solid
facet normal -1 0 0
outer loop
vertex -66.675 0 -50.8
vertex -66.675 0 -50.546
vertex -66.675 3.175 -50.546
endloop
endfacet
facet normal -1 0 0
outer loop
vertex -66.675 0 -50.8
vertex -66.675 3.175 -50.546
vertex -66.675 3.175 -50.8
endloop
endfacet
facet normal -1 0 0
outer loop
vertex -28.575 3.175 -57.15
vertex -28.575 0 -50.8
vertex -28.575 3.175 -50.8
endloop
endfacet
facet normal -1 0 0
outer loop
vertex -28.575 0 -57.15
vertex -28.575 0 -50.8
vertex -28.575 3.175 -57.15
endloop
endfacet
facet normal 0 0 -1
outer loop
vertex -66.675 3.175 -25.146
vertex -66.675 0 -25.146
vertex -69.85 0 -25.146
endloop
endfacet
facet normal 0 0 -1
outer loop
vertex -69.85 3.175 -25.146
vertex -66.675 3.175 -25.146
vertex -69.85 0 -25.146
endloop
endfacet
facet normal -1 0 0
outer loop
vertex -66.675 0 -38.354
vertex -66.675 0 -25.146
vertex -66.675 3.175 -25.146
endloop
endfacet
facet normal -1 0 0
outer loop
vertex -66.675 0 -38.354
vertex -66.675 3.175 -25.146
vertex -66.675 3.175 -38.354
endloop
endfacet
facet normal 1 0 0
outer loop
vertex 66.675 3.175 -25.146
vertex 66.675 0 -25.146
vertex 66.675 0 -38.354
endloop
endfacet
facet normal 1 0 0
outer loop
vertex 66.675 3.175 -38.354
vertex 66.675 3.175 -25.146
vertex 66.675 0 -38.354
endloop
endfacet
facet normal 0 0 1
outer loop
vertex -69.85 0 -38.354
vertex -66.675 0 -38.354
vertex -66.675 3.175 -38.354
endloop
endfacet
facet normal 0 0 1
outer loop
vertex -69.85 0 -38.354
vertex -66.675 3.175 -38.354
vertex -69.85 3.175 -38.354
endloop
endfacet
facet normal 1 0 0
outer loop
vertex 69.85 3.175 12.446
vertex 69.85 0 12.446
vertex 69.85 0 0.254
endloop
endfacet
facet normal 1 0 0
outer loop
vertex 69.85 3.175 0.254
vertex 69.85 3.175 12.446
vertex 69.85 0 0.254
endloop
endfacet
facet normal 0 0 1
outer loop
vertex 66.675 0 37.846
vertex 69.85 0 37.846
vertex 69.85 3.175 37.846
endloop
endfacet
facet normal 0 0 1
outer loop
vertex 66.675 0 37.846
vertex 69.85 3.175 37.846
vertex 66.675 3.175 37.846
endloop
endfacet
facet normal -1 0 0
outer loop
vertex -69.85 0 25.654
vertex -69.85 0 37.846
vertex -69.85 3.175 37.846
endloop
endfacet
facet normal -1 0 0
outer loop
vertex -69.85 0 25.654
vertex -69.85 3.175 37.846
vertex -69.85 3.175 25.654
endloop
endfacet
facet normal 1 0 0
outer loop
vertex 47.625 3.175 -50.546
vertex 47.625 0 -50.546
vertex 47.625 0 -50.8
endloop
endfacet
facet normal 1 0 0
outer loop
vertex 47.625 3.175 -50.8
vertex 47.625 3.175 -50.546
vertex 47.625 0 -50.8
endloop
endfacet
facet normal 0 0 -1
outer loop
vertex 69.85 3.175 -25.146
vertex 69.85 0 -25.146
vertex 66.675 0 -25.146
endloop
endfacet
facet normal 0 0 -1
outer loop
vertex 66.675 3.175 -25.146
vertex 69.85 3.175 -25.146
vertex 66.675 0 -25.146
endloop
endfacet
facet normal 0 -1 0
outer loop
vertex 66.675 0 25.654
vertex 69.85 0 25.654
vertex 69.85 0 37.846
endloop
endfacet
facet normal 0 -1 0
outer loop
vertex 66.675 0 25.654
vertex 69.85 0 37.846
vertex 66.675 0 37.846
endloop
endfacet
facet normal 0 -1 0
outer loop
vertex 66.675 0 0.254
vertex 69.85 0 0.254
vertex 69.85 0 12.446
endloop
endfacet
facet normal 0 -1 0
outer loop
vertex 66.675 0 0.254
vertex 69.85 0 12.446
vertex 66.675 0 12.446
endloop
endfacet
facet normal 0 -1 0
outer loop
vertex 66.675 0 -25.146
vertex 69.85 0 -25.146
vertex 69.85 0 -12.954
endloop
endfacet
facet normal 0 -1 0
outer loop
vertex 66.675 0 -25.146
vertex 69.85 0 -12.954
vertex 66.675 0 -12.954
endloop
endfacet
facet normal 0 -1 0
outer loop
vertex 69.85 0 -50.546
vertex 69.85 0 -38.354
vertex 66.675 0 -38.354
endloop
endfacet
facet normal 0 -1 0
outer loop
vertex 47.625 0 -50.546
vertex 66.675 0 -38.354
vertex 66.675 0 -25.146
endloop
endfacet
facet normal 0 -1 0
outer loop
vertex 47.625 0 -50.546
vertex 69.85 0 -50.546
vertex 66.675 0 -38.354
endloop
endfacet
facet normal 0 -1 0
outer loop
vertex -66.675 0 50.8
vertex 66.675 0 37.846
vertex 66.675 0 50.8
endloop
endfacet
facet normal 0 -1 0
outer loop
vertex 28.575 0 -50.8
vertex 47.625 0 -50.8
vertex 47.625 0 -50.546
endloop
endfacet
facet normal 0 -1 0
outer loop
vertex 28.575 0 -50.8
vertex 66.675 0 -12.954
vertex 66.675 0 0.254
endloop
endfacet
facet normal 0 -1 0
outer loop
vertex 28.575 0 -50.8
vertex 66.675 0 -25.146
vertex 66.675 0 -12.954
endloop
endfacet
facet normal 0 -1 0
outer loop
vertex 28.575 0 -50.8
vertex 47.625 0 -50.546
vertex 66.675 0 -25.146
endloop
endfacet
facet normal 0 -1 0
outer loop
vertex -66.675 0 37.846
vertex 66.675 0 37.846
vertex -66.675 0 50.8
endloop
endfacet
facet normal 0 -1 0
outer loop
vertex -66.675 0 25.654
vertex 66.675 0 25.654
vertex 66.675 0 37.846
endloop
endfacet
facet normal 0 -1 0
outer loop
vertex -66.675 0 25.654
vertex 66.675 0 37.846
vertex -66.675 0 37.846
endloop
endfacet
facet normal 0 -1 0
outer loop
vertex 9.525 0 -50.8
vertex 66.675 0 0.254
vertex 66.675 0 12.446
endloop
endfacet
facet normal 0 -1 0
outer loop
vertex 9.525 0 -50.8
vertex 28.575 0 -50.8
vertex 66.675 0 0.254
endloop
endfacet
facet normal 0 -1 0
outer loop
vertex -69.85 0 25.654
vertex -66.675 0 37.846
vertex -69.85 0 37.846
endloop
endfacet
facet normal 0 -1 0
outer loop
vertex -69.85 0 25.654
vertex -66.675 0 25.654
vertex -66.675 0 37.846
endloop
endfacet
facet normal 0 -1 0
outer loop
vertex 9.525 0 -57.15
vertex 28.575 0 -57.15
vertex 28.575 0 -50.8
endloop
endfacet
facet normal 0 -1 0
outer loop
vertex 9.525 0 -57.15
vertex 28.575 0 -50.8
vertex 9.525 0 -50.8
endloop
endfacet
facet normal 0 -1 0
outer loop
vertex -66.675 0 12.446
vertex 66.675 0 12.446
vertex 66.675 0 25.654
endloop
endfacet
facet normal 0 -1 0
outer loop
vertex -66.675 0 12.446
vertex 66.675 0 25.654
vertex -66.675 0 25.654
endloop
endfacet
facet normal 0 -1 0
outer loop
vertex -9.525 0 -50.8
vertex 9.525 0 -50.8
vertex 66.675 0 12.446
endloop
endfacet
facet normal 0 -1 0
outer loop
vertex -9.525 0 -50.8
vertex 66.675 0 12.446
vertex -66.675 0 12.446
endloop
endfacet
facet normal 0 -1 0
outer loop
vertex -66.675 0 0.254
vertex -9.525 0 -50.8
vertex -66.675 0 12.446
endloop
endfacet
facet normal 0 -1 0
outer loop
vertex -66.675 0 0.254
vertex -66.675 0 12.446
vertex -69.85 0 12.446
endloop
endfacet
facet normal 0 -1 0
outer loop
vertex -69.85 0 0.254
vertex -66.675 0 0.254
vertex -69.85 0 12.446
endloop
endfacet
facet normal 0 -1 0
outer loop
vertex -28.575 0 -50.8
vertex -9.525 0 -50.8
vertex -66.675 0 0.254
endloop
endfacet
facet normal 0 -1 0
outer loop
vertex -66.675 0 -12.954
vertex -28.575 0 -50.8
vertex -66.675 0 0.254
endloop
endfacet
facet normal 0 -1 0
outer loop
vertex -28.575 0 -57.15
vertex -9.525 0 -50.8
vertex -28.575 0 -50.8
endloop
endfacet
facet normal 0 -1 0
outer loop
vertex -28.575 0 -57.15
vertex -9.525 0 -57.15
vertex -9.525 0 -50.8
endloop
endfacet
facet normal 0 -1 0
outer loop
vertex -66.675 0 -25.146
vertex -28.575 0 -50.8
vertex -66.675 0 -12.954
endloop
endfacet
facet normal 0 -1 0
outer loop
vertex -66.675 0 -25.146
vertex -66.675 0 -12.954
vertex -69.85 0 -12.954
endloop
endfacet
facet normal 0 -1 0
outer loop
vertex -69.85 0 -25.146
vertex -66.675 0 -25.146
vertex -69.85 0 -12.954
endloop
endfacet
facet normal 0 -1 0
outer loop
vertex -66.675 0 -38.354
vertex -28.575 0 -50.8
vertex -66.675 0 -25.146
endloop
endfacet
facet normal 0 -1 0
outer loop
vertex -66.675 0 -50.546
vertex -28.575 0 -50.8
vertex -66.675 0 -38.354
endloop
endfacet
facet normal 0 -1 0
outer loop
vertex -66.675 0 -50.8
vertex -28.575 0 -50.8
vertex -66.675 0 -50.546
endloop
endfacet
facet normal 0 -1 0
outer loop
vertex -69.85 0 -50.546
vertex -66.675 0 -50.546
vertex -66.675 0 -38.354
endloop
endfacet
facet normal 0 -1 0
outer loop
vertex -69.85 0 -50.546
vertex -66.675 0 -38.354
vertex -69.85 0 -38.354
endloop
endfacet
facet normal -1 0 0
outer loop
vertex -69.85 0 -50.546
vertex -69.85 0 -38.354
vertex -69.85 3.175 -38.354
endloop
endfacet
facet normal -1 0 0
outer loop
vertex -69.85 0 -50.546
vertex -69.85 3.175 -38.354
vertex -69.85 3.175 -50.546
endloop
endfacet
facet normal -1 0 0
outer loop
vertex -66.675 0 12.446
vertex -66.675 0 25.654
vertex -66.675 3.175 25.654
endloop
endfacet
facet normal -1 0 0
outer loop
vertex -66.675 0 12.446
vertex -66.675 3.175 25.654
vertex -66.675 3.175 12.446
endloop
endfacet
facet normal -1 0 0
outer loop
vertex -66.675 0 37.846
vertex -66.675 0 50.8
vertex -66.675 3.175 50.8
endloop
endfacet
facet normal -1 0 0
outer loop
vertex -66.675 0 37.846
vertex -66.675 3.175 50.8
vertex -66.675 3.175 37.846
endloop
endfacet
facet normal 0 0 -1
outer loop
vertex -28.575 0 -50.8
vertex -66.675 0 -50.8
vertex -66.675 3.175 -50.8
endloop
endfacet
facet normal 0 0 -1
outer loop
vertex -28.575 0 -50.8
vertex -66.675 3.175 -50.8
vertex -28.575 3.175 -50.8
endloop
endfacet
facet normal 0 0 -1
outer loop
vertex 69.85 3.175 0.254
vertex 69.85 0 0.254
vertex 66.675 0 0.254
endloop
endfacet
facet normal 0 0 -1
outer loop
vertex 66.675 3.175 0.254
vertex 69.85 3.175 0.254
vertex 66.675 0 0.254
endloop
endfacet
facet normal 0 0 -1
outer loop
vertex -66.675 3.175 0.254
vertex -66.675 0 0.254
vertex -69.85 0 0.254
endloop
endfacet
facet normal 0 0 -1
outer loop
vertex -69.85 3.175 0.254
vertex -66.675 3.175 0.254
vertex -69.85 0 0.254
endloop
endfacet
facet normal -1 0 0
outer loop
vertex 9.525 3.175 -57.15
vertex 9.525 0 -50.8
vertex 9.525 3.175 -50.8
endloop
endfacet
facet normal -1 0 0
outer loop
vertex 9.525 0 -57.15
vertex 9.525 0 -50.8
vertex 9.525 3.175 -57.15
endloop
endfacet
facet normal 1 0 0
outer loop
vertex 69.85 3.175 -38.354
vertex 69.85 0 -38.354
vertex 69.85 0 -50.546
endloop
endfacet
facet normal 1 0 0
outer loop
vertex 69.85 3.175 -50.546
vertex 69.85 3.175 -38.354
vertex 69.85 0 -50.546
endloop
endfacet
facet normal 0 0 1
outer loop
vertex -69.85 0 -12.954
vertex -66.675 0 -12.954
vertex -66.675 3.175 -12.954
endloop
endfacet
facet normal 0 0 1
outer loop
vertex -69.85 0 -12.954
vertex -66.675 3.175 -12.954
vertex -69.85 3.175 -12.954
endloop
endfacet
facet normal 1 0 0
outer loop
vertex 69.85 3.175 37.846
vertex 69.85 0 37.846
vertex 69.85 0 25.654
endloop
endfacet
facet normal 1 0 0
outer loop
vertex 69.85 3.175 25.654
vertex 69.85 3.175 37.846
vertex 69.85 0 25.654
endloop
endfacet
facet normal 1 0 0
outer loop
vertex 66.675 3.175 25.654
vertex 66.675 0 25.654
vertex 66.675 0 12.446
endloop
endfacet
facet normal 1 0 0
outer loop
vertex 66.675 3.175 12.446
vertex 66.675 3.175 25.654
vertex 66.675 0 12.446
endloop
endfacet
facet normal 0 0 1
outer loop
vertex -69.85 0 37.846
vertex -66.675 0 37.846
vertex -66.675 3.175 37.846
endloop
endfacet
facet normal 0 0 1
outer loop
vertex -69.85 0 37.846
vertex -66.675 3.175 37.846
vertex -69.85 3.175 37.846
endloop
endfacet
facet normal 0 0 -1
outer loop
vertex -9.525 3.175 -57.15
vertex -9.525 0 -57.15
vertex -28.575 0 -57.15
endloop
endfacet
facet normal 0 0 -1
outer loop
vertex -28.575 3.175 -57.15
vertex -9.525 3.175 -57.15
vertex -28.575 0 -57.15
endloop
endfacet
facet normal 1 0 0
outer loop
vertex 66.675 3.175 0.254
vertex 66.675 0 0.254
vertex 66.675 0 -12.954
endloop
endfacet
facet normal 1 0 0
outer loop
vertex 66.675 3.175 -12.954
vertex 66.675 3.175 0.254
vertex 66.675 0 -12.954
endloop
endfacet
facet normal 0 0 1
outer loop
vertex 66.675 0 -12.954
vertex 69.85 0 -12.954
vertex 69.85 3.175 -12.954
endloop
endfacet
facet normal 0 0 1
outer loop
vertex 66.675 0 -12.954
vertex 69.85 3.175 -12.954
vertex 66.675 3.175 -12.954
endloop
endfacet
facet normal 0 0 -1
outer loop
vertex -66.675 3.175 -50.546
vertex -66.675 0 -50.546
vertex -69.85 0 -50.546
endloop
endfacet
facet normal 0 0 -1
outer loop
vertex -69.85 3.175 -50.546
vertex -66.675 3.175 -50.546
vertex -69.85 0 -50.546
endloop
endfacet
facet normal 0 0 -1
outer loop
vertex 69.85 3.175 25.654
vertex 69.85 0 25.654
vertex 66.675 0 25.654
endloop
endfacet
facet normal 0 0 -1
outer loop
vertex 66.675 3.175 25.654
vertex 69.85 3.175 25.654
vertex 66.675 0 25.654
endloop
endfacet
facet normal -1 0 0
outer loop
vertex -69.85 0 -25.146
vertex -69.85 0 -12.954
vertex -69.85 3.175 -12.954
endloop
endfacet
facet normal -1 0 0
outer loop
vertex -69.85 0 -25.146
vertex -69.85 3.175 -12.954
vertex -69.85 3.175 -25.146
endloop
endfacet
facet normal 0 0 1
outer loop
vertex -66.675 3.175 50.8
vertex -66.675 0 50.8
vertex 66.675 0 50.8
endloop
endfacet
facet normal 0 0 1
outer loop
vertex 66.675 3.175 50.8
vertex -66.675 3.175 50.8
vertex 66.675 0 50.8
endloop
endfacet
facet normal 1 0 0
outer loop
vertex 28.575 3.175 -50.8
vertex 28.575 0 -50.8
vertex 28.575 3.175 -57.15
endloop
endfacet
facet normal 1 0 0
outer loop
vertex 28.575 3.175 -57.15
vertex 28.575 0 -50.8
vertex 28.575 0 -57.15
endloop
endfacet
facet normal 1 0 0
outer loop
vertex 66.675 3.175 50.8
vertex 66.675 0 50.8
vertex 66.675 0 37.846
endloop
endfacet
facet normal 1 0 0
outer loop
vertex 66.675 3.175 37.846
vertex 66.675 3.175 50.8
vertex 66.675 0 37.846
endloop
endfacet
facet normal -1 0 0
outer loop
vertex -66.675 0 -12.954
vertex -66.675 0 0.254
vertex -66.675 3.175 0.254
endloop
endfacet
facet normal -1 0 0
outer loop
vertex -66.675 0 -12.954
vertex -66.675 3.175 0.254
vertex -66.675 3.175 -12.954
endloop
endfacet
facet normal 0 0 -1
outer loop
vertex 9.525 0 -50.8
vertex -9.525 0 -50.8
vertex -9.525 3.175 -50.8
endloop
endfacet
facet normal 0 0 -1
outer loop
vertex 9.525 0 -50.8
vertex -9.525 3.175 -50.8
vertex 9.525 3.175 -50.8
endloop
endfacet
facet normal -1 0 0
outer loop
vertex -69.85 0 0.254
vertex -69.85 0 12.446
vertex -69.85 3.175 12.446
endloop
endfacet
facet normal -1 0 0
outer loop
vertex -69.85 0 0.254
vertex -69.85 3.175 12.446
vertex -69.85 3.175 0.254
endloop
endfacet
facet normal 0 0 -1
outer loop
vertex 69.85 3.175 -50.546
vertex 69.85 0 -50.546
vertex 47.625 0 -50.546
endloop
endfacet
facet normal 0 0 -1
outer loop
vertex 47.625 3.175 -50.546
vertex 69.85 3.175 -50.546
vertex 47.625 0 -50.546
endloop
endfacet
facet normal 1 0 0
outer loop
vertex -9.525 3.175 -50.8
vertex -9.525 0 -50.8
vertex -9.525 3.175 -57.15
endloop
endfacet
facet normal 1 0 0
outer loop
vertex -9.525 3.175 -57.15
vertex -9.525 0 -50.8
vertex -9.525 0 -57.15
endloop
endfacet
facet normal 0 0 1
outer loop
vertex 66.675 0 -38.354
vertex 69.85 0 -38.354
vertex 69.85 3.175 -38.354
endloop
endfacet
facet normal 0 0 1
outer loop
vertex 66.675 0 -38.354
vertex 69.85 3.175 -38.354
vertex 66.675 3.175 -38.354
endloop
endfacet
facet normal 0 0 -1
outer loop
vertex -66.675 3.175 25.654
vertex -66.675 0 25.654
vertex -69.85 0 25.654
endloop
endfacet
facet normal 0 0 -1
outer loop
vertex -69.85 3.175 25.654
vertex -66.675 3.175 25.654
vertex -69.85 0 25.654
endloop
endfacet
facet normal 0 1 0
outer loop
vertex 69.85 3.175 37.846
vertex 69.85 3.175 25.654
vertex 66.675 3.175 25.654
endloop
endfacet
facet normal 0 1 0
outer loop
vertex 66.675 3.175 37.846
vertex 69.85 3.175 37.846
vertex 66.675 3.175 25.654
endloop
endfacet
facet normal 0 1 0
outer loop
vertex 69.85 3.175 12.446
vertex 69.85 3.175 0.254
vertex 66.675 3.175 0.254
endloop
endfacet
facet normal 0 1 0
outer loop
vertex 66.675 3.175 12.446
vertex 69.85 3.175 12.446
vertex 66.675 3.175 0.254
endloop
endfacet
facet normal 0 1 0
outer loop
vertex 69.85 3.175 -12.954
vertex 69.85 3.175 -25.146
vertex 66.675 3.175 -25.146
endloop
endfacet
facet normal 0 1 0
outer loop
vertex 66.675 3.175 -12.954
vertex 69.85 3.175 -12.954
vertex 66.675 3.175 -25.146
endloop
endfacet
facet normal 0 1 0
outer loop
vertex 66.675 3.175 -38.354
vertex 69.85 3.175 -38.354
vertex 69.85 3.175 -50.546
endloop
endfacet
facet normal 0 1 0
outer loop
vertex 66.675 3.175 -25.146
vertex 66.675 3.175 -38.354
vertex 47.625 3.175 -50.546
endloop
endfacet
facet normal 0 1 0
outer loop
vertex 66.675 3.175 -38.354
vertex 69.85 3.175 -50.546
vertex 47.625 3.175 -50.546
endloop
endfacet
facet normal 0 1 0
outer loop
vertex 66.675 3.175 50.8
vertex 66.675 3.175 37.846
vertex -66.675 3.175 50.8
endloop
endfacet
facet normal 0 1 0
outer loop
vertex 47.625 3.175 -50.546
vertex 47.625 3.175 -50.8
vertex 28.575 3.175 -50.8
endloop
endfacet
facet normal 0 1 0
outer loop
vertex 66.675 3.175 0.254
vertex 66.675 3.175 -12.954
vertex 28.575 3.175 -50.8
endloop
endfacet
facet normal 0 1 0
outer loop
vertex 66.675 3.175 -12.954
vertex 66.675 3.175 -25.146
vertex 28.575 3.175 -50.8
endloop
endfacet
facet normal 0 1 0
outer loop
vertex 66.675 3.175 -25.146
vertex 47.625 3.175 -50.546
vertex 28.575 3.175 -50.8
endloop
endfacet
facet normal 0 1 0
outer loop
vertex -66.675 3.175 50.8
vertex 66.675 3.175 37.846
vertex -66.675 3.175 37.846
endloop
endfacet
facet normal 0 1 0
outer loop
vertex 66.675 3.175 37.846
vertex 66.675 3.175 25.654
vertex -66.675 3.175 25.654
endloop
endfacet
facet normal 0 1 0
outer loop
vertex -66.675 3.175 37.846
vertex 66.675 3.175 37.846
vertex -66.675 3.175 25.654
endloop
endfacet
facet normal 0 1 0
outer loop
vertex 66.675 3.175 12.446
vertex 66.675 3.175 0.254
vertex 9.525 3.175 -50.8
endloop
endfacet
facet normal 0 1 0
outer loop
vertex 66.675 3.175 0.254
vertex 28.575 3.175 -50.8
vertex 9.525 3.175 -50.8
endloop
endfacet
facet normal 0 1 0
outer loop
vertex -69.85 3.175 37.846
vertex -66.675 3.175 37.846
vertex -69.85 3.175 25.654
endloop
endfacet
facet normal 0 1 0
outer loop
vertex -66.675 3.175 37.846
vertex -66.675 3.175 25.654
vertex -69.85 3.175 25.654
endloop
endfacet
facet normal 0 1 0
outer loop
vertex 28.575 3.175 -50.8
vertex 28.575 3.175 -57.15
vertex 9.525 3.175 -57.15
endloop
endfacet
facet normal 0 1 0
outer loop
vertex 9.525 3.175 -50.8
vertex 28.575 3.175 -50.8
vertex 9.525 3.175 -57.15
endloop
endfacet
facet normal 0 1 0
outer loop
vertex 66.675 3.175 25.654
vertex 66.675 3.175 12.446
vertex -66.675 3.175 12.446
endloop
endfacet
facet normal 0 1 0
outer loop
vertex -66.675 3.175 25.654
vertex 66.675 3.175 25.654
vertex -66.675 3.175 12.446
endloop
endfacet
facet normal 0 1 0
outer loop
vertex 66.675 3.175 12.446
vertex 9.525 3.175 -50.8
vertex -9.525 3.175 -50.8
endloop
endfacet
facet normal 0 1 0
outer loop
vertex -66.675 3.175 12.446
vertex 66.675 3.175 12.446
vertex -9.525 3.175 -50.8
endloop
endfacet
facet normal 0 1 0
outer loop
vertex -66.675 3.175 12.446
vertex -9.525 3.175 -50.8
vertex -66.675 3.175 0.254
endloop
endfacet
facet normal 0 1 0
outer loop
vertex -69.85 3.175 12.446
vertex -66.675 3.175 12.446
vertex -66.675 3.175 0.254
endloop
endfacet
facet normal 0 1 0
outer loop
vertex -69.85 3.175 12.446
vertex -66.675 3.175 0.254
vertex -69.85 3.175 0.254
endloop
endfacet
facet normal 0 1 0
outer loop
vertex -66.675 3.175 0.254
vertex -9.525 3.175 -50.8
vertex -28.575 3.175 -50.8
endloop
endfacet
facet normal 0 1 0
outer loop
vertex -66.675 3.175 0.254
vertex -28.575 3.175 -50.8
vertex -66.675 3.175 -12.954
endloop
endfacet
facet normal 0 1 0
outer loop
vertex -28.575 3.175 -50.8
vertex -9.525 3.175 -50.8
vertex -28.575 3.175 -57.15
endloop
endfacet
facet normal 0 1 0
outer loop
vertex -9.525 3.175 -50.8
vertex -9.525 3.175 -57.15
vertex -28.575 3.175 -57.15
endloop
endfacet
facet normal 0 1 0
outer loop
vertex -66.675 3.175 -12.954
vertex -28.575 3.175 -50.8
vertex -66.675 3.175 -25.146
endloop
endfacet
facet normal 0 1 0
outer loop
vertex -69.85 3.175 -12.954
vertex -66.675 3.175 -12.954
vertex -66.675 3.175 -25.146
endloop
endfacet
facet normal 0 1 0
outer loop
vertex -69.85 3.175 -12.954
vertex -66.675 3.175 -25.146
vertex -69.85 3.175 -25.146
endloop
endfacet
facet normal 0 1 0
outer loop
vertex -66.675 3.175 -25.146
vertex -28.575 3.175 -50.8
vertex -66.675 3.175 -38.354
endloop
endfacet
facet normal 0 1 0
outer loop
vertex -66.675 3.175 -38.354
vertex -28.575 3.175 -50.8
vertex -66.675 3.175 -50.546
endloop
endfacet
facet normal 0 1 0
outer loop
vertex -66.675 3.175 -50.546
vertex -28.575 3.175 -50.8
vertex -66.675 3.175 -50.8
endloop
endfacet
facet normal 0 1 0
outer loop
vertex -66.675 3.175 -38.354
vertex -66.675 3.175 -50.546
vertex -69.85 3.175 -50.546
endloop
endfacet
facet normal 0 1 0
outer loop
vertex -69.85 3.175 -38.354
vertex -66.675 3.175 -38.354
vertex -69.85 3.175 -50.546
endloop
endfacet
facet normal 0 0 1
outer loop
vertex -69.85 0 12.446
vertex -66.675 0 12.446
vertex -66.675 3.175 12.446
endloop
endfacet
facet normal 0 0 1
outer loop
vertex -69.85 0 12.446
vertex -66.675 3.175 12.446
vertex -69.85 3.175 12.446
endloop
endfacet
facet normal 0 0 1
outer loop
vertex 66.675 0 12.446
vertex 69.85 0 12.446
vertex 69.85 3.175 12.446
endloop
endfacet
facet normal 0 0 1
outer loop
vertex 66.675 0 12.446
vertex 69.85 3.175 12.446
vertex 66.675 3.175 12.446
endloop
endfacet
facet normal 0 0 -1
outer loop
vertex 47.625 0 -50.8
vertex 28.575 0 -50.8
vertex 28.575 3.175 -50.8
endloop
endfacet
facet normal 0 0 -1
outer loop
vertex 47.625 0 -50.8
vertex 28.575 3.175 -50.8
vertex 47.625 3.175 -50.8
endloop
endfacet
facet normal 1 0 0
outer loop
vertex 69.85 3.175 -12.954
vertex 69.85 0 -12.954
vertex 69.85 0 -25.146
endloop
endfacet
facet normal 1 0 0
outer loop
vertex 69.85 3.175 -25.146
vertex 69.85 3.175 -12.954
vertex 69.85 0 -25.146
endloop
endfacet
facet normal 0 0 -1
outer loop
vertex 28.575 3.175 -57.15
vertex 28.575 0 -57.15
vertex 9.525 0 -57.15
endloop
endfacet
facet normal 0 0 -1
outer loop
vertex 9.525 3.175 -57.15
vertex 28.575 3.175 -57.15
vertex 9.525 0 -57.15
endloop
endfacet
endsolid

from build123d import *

# Parameters (mm, degrees)
SKETCH1_W           = 133.35
SKETCH1_H           = 101.6
BOSS_EXTRUDE1_DEPTH = 3.175
SKETCH2_W           = 3.175
SKETCH2_H           = 12.192
SKETCH2_W_2         = 19.05
SKETCH2_H_2         = 6.35
BOSS_EXTRUDE2_DEPTH = 3.175
SKETCH3_W           = 19.05
SKETCH3_H           = 6.35
SKETCH3_H_2         = 6.604
CUT_EXTRUDE1_DEPTH  = 91.306287849


with BuildPart() as part:
    # Sketch1 → Boss-Extrude1 (new body)
    with BuildSketch(Plane(origin=(0, 0, 0), x_dir=(1, 0, 0), z_dir=(0, 1, 0))):
        Rectangle(SKETCH1_W, SKETCH1_H)
    extrude(amount=BOSS_EXTRUDE1_DEPTH)

    # Sketch2 → Boss-Extrude2 (add)
    with BuildSketch(Plane(origin=(0, 0, 0), x_dir=(-1, 0, 0), z_dir=(0, -1, 0))):
        with Locations((68.2625, -31.75)):
            Rectangle(SKETCH2_W, SKETCH2_H)
        with Locations((68.2625, -6.35)):
            Rectangle(SKETCH2_W, SKETCH2_H)
        with Locations((68.2625, 19.05)):
            Rectangle(SKETCH2_W, SKETCH2_H)
        with Locations((68.2625, 44.45)):
            Rectangle(SKETCH2_W, SKETCH2_H)
        with Locations((-68.2625, 44.45)):
            Rectangle(SKETCH2_W, SKETCH2_H)
        with Locations((-68.2625, 19.05)):
            Rectangle(SKETCH2_W, SKETCH2_H)
        with Locations((-68.2625, -6.35)):
            Rectangle(SKETCH2_W, SKETCH2_H)
        with Locations((-68.2625, -31.75)):
            Rectangle(SKETCH2_W, SKETCH2_H)
        with Locations((19.05, 53.975)):
            Rectangle(SKETCH2_W_2, SKETCH2_H_2)
        with Locations((57.15, 53.975)):
            Rectangle(SKETCH2_W_2, SKETCH2_H_2)
        with Locations((-19.05, 53.975)):
            Rectangle(SKETCH2_W_2, SKETCH2_H_2)
        with Locations((-57.15, 53.975)):
            Rectangle(SKETCH2_W_2, SKETCH2_H_2)
    extrude(amount=-BOSS_EXTRUDE2_DEPTH)

    # Sketch3 → Cut-Extrude1 (cut, through all)
    with BuildSketch(Plane(origin=(0, 0, 0), x_dir=(1, 0, 0), z_dir=(0, 1, 0))):
        with Locations((-57.15, 53.975)):
            Rectangle(SKETCH3_W, SKETCH3_H)
        with Locations((57.15, 53.848)):
            Rectangle(SKETCH3_W, SKETCH3_H_2)
    extrude(amount=CUT_EXTRUDE1_DEPTH, mode=Mode.SUBTRACT)


solid = part.part
